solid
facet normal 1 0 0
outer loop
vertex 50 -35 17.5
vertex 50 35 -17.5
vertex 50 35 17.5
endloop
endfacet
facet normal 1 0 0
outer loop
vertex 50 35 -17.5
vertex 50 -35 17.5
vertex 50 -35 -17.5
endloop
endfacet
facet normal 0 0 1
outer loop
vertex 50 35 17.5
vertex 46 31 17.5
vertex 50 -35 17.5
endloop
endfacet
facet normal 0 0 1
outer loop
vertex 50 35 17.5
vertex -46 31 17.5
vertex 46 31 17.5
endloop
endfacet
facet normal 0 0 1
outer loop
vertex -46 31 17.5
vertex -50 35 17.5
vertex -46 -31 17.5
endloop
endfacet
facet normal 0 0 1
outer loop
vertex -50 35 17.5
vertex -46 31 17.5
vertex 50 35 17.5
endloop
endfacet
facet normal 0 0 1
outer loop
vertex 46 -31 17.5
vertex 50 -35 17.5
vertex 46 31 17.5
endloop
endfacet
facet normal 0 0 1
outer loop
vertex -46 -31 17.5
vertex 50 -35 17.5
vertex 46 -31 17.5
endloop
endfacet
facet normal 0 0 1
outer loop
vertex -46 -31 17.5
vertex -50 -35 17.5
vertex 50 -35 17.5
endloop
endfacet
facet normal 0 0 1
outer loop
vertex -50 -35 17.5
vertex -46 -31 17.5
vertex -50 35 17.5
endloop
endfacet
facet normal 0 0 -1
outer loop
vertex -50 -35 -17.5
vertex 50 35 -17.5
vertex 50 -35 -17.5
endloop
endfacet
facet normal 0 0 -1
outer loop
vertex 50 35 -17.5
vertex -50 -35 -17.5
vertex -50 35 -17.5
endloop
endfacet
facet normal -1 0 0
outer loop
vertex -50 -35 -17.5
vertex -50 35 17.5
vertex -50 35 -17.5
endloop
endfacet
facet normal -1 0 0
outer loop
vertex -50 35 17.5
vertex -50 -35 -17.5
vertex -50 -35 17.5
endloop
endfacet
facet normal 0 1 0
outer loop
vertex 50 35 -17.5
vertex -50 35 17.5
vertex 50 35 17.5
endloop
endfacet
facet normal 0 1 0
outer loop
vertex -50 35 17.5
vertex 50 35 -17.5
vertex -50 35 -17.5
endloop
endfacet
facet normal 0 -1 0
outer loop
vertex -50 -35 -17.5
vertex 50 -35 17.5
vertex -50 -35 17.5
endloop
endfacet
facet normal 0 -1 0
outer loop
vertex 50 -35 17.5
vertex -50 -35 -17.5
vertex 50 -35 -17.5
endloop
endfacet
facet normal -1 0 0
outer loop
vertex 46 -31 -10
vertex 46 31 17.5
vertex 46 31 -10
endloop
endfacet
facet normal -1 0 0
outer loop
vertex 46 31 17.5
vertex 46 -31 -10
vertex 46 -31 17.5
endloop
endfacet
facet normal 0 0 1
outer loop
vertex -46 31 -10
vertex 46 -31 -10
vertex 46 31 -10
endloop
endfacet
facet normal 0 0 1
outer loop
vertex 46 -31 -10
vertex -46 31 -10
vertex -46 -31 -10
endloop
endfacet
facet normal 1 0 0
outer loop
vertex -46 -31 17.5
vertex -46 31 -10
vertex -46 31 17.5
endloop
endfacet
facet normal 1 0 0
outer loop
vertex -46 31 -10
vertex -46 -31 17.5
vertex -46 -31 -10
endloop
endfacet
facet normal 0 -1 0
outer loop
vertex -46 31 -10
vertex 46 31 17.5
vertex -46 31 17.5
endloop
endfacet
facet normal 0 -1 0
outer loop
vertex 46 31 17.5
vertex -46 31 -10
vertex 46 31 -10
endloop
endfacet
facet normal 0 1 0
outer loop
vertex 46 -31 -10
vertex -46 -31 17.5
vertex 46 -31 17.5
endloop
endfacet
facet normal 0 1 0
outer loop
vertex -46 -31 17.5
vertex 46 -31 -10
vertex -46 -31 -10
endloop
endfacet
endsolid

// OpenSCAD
// Processor Housing (Jetson Orin Nano) Parametric CAD Script
module processor_housing() {
    difference() {
        cube([100, 70, 35], center=true);
        translate([0, 0, 5])
            cube([92, 62, 30], center=true);
    }
}
processor_housing();
